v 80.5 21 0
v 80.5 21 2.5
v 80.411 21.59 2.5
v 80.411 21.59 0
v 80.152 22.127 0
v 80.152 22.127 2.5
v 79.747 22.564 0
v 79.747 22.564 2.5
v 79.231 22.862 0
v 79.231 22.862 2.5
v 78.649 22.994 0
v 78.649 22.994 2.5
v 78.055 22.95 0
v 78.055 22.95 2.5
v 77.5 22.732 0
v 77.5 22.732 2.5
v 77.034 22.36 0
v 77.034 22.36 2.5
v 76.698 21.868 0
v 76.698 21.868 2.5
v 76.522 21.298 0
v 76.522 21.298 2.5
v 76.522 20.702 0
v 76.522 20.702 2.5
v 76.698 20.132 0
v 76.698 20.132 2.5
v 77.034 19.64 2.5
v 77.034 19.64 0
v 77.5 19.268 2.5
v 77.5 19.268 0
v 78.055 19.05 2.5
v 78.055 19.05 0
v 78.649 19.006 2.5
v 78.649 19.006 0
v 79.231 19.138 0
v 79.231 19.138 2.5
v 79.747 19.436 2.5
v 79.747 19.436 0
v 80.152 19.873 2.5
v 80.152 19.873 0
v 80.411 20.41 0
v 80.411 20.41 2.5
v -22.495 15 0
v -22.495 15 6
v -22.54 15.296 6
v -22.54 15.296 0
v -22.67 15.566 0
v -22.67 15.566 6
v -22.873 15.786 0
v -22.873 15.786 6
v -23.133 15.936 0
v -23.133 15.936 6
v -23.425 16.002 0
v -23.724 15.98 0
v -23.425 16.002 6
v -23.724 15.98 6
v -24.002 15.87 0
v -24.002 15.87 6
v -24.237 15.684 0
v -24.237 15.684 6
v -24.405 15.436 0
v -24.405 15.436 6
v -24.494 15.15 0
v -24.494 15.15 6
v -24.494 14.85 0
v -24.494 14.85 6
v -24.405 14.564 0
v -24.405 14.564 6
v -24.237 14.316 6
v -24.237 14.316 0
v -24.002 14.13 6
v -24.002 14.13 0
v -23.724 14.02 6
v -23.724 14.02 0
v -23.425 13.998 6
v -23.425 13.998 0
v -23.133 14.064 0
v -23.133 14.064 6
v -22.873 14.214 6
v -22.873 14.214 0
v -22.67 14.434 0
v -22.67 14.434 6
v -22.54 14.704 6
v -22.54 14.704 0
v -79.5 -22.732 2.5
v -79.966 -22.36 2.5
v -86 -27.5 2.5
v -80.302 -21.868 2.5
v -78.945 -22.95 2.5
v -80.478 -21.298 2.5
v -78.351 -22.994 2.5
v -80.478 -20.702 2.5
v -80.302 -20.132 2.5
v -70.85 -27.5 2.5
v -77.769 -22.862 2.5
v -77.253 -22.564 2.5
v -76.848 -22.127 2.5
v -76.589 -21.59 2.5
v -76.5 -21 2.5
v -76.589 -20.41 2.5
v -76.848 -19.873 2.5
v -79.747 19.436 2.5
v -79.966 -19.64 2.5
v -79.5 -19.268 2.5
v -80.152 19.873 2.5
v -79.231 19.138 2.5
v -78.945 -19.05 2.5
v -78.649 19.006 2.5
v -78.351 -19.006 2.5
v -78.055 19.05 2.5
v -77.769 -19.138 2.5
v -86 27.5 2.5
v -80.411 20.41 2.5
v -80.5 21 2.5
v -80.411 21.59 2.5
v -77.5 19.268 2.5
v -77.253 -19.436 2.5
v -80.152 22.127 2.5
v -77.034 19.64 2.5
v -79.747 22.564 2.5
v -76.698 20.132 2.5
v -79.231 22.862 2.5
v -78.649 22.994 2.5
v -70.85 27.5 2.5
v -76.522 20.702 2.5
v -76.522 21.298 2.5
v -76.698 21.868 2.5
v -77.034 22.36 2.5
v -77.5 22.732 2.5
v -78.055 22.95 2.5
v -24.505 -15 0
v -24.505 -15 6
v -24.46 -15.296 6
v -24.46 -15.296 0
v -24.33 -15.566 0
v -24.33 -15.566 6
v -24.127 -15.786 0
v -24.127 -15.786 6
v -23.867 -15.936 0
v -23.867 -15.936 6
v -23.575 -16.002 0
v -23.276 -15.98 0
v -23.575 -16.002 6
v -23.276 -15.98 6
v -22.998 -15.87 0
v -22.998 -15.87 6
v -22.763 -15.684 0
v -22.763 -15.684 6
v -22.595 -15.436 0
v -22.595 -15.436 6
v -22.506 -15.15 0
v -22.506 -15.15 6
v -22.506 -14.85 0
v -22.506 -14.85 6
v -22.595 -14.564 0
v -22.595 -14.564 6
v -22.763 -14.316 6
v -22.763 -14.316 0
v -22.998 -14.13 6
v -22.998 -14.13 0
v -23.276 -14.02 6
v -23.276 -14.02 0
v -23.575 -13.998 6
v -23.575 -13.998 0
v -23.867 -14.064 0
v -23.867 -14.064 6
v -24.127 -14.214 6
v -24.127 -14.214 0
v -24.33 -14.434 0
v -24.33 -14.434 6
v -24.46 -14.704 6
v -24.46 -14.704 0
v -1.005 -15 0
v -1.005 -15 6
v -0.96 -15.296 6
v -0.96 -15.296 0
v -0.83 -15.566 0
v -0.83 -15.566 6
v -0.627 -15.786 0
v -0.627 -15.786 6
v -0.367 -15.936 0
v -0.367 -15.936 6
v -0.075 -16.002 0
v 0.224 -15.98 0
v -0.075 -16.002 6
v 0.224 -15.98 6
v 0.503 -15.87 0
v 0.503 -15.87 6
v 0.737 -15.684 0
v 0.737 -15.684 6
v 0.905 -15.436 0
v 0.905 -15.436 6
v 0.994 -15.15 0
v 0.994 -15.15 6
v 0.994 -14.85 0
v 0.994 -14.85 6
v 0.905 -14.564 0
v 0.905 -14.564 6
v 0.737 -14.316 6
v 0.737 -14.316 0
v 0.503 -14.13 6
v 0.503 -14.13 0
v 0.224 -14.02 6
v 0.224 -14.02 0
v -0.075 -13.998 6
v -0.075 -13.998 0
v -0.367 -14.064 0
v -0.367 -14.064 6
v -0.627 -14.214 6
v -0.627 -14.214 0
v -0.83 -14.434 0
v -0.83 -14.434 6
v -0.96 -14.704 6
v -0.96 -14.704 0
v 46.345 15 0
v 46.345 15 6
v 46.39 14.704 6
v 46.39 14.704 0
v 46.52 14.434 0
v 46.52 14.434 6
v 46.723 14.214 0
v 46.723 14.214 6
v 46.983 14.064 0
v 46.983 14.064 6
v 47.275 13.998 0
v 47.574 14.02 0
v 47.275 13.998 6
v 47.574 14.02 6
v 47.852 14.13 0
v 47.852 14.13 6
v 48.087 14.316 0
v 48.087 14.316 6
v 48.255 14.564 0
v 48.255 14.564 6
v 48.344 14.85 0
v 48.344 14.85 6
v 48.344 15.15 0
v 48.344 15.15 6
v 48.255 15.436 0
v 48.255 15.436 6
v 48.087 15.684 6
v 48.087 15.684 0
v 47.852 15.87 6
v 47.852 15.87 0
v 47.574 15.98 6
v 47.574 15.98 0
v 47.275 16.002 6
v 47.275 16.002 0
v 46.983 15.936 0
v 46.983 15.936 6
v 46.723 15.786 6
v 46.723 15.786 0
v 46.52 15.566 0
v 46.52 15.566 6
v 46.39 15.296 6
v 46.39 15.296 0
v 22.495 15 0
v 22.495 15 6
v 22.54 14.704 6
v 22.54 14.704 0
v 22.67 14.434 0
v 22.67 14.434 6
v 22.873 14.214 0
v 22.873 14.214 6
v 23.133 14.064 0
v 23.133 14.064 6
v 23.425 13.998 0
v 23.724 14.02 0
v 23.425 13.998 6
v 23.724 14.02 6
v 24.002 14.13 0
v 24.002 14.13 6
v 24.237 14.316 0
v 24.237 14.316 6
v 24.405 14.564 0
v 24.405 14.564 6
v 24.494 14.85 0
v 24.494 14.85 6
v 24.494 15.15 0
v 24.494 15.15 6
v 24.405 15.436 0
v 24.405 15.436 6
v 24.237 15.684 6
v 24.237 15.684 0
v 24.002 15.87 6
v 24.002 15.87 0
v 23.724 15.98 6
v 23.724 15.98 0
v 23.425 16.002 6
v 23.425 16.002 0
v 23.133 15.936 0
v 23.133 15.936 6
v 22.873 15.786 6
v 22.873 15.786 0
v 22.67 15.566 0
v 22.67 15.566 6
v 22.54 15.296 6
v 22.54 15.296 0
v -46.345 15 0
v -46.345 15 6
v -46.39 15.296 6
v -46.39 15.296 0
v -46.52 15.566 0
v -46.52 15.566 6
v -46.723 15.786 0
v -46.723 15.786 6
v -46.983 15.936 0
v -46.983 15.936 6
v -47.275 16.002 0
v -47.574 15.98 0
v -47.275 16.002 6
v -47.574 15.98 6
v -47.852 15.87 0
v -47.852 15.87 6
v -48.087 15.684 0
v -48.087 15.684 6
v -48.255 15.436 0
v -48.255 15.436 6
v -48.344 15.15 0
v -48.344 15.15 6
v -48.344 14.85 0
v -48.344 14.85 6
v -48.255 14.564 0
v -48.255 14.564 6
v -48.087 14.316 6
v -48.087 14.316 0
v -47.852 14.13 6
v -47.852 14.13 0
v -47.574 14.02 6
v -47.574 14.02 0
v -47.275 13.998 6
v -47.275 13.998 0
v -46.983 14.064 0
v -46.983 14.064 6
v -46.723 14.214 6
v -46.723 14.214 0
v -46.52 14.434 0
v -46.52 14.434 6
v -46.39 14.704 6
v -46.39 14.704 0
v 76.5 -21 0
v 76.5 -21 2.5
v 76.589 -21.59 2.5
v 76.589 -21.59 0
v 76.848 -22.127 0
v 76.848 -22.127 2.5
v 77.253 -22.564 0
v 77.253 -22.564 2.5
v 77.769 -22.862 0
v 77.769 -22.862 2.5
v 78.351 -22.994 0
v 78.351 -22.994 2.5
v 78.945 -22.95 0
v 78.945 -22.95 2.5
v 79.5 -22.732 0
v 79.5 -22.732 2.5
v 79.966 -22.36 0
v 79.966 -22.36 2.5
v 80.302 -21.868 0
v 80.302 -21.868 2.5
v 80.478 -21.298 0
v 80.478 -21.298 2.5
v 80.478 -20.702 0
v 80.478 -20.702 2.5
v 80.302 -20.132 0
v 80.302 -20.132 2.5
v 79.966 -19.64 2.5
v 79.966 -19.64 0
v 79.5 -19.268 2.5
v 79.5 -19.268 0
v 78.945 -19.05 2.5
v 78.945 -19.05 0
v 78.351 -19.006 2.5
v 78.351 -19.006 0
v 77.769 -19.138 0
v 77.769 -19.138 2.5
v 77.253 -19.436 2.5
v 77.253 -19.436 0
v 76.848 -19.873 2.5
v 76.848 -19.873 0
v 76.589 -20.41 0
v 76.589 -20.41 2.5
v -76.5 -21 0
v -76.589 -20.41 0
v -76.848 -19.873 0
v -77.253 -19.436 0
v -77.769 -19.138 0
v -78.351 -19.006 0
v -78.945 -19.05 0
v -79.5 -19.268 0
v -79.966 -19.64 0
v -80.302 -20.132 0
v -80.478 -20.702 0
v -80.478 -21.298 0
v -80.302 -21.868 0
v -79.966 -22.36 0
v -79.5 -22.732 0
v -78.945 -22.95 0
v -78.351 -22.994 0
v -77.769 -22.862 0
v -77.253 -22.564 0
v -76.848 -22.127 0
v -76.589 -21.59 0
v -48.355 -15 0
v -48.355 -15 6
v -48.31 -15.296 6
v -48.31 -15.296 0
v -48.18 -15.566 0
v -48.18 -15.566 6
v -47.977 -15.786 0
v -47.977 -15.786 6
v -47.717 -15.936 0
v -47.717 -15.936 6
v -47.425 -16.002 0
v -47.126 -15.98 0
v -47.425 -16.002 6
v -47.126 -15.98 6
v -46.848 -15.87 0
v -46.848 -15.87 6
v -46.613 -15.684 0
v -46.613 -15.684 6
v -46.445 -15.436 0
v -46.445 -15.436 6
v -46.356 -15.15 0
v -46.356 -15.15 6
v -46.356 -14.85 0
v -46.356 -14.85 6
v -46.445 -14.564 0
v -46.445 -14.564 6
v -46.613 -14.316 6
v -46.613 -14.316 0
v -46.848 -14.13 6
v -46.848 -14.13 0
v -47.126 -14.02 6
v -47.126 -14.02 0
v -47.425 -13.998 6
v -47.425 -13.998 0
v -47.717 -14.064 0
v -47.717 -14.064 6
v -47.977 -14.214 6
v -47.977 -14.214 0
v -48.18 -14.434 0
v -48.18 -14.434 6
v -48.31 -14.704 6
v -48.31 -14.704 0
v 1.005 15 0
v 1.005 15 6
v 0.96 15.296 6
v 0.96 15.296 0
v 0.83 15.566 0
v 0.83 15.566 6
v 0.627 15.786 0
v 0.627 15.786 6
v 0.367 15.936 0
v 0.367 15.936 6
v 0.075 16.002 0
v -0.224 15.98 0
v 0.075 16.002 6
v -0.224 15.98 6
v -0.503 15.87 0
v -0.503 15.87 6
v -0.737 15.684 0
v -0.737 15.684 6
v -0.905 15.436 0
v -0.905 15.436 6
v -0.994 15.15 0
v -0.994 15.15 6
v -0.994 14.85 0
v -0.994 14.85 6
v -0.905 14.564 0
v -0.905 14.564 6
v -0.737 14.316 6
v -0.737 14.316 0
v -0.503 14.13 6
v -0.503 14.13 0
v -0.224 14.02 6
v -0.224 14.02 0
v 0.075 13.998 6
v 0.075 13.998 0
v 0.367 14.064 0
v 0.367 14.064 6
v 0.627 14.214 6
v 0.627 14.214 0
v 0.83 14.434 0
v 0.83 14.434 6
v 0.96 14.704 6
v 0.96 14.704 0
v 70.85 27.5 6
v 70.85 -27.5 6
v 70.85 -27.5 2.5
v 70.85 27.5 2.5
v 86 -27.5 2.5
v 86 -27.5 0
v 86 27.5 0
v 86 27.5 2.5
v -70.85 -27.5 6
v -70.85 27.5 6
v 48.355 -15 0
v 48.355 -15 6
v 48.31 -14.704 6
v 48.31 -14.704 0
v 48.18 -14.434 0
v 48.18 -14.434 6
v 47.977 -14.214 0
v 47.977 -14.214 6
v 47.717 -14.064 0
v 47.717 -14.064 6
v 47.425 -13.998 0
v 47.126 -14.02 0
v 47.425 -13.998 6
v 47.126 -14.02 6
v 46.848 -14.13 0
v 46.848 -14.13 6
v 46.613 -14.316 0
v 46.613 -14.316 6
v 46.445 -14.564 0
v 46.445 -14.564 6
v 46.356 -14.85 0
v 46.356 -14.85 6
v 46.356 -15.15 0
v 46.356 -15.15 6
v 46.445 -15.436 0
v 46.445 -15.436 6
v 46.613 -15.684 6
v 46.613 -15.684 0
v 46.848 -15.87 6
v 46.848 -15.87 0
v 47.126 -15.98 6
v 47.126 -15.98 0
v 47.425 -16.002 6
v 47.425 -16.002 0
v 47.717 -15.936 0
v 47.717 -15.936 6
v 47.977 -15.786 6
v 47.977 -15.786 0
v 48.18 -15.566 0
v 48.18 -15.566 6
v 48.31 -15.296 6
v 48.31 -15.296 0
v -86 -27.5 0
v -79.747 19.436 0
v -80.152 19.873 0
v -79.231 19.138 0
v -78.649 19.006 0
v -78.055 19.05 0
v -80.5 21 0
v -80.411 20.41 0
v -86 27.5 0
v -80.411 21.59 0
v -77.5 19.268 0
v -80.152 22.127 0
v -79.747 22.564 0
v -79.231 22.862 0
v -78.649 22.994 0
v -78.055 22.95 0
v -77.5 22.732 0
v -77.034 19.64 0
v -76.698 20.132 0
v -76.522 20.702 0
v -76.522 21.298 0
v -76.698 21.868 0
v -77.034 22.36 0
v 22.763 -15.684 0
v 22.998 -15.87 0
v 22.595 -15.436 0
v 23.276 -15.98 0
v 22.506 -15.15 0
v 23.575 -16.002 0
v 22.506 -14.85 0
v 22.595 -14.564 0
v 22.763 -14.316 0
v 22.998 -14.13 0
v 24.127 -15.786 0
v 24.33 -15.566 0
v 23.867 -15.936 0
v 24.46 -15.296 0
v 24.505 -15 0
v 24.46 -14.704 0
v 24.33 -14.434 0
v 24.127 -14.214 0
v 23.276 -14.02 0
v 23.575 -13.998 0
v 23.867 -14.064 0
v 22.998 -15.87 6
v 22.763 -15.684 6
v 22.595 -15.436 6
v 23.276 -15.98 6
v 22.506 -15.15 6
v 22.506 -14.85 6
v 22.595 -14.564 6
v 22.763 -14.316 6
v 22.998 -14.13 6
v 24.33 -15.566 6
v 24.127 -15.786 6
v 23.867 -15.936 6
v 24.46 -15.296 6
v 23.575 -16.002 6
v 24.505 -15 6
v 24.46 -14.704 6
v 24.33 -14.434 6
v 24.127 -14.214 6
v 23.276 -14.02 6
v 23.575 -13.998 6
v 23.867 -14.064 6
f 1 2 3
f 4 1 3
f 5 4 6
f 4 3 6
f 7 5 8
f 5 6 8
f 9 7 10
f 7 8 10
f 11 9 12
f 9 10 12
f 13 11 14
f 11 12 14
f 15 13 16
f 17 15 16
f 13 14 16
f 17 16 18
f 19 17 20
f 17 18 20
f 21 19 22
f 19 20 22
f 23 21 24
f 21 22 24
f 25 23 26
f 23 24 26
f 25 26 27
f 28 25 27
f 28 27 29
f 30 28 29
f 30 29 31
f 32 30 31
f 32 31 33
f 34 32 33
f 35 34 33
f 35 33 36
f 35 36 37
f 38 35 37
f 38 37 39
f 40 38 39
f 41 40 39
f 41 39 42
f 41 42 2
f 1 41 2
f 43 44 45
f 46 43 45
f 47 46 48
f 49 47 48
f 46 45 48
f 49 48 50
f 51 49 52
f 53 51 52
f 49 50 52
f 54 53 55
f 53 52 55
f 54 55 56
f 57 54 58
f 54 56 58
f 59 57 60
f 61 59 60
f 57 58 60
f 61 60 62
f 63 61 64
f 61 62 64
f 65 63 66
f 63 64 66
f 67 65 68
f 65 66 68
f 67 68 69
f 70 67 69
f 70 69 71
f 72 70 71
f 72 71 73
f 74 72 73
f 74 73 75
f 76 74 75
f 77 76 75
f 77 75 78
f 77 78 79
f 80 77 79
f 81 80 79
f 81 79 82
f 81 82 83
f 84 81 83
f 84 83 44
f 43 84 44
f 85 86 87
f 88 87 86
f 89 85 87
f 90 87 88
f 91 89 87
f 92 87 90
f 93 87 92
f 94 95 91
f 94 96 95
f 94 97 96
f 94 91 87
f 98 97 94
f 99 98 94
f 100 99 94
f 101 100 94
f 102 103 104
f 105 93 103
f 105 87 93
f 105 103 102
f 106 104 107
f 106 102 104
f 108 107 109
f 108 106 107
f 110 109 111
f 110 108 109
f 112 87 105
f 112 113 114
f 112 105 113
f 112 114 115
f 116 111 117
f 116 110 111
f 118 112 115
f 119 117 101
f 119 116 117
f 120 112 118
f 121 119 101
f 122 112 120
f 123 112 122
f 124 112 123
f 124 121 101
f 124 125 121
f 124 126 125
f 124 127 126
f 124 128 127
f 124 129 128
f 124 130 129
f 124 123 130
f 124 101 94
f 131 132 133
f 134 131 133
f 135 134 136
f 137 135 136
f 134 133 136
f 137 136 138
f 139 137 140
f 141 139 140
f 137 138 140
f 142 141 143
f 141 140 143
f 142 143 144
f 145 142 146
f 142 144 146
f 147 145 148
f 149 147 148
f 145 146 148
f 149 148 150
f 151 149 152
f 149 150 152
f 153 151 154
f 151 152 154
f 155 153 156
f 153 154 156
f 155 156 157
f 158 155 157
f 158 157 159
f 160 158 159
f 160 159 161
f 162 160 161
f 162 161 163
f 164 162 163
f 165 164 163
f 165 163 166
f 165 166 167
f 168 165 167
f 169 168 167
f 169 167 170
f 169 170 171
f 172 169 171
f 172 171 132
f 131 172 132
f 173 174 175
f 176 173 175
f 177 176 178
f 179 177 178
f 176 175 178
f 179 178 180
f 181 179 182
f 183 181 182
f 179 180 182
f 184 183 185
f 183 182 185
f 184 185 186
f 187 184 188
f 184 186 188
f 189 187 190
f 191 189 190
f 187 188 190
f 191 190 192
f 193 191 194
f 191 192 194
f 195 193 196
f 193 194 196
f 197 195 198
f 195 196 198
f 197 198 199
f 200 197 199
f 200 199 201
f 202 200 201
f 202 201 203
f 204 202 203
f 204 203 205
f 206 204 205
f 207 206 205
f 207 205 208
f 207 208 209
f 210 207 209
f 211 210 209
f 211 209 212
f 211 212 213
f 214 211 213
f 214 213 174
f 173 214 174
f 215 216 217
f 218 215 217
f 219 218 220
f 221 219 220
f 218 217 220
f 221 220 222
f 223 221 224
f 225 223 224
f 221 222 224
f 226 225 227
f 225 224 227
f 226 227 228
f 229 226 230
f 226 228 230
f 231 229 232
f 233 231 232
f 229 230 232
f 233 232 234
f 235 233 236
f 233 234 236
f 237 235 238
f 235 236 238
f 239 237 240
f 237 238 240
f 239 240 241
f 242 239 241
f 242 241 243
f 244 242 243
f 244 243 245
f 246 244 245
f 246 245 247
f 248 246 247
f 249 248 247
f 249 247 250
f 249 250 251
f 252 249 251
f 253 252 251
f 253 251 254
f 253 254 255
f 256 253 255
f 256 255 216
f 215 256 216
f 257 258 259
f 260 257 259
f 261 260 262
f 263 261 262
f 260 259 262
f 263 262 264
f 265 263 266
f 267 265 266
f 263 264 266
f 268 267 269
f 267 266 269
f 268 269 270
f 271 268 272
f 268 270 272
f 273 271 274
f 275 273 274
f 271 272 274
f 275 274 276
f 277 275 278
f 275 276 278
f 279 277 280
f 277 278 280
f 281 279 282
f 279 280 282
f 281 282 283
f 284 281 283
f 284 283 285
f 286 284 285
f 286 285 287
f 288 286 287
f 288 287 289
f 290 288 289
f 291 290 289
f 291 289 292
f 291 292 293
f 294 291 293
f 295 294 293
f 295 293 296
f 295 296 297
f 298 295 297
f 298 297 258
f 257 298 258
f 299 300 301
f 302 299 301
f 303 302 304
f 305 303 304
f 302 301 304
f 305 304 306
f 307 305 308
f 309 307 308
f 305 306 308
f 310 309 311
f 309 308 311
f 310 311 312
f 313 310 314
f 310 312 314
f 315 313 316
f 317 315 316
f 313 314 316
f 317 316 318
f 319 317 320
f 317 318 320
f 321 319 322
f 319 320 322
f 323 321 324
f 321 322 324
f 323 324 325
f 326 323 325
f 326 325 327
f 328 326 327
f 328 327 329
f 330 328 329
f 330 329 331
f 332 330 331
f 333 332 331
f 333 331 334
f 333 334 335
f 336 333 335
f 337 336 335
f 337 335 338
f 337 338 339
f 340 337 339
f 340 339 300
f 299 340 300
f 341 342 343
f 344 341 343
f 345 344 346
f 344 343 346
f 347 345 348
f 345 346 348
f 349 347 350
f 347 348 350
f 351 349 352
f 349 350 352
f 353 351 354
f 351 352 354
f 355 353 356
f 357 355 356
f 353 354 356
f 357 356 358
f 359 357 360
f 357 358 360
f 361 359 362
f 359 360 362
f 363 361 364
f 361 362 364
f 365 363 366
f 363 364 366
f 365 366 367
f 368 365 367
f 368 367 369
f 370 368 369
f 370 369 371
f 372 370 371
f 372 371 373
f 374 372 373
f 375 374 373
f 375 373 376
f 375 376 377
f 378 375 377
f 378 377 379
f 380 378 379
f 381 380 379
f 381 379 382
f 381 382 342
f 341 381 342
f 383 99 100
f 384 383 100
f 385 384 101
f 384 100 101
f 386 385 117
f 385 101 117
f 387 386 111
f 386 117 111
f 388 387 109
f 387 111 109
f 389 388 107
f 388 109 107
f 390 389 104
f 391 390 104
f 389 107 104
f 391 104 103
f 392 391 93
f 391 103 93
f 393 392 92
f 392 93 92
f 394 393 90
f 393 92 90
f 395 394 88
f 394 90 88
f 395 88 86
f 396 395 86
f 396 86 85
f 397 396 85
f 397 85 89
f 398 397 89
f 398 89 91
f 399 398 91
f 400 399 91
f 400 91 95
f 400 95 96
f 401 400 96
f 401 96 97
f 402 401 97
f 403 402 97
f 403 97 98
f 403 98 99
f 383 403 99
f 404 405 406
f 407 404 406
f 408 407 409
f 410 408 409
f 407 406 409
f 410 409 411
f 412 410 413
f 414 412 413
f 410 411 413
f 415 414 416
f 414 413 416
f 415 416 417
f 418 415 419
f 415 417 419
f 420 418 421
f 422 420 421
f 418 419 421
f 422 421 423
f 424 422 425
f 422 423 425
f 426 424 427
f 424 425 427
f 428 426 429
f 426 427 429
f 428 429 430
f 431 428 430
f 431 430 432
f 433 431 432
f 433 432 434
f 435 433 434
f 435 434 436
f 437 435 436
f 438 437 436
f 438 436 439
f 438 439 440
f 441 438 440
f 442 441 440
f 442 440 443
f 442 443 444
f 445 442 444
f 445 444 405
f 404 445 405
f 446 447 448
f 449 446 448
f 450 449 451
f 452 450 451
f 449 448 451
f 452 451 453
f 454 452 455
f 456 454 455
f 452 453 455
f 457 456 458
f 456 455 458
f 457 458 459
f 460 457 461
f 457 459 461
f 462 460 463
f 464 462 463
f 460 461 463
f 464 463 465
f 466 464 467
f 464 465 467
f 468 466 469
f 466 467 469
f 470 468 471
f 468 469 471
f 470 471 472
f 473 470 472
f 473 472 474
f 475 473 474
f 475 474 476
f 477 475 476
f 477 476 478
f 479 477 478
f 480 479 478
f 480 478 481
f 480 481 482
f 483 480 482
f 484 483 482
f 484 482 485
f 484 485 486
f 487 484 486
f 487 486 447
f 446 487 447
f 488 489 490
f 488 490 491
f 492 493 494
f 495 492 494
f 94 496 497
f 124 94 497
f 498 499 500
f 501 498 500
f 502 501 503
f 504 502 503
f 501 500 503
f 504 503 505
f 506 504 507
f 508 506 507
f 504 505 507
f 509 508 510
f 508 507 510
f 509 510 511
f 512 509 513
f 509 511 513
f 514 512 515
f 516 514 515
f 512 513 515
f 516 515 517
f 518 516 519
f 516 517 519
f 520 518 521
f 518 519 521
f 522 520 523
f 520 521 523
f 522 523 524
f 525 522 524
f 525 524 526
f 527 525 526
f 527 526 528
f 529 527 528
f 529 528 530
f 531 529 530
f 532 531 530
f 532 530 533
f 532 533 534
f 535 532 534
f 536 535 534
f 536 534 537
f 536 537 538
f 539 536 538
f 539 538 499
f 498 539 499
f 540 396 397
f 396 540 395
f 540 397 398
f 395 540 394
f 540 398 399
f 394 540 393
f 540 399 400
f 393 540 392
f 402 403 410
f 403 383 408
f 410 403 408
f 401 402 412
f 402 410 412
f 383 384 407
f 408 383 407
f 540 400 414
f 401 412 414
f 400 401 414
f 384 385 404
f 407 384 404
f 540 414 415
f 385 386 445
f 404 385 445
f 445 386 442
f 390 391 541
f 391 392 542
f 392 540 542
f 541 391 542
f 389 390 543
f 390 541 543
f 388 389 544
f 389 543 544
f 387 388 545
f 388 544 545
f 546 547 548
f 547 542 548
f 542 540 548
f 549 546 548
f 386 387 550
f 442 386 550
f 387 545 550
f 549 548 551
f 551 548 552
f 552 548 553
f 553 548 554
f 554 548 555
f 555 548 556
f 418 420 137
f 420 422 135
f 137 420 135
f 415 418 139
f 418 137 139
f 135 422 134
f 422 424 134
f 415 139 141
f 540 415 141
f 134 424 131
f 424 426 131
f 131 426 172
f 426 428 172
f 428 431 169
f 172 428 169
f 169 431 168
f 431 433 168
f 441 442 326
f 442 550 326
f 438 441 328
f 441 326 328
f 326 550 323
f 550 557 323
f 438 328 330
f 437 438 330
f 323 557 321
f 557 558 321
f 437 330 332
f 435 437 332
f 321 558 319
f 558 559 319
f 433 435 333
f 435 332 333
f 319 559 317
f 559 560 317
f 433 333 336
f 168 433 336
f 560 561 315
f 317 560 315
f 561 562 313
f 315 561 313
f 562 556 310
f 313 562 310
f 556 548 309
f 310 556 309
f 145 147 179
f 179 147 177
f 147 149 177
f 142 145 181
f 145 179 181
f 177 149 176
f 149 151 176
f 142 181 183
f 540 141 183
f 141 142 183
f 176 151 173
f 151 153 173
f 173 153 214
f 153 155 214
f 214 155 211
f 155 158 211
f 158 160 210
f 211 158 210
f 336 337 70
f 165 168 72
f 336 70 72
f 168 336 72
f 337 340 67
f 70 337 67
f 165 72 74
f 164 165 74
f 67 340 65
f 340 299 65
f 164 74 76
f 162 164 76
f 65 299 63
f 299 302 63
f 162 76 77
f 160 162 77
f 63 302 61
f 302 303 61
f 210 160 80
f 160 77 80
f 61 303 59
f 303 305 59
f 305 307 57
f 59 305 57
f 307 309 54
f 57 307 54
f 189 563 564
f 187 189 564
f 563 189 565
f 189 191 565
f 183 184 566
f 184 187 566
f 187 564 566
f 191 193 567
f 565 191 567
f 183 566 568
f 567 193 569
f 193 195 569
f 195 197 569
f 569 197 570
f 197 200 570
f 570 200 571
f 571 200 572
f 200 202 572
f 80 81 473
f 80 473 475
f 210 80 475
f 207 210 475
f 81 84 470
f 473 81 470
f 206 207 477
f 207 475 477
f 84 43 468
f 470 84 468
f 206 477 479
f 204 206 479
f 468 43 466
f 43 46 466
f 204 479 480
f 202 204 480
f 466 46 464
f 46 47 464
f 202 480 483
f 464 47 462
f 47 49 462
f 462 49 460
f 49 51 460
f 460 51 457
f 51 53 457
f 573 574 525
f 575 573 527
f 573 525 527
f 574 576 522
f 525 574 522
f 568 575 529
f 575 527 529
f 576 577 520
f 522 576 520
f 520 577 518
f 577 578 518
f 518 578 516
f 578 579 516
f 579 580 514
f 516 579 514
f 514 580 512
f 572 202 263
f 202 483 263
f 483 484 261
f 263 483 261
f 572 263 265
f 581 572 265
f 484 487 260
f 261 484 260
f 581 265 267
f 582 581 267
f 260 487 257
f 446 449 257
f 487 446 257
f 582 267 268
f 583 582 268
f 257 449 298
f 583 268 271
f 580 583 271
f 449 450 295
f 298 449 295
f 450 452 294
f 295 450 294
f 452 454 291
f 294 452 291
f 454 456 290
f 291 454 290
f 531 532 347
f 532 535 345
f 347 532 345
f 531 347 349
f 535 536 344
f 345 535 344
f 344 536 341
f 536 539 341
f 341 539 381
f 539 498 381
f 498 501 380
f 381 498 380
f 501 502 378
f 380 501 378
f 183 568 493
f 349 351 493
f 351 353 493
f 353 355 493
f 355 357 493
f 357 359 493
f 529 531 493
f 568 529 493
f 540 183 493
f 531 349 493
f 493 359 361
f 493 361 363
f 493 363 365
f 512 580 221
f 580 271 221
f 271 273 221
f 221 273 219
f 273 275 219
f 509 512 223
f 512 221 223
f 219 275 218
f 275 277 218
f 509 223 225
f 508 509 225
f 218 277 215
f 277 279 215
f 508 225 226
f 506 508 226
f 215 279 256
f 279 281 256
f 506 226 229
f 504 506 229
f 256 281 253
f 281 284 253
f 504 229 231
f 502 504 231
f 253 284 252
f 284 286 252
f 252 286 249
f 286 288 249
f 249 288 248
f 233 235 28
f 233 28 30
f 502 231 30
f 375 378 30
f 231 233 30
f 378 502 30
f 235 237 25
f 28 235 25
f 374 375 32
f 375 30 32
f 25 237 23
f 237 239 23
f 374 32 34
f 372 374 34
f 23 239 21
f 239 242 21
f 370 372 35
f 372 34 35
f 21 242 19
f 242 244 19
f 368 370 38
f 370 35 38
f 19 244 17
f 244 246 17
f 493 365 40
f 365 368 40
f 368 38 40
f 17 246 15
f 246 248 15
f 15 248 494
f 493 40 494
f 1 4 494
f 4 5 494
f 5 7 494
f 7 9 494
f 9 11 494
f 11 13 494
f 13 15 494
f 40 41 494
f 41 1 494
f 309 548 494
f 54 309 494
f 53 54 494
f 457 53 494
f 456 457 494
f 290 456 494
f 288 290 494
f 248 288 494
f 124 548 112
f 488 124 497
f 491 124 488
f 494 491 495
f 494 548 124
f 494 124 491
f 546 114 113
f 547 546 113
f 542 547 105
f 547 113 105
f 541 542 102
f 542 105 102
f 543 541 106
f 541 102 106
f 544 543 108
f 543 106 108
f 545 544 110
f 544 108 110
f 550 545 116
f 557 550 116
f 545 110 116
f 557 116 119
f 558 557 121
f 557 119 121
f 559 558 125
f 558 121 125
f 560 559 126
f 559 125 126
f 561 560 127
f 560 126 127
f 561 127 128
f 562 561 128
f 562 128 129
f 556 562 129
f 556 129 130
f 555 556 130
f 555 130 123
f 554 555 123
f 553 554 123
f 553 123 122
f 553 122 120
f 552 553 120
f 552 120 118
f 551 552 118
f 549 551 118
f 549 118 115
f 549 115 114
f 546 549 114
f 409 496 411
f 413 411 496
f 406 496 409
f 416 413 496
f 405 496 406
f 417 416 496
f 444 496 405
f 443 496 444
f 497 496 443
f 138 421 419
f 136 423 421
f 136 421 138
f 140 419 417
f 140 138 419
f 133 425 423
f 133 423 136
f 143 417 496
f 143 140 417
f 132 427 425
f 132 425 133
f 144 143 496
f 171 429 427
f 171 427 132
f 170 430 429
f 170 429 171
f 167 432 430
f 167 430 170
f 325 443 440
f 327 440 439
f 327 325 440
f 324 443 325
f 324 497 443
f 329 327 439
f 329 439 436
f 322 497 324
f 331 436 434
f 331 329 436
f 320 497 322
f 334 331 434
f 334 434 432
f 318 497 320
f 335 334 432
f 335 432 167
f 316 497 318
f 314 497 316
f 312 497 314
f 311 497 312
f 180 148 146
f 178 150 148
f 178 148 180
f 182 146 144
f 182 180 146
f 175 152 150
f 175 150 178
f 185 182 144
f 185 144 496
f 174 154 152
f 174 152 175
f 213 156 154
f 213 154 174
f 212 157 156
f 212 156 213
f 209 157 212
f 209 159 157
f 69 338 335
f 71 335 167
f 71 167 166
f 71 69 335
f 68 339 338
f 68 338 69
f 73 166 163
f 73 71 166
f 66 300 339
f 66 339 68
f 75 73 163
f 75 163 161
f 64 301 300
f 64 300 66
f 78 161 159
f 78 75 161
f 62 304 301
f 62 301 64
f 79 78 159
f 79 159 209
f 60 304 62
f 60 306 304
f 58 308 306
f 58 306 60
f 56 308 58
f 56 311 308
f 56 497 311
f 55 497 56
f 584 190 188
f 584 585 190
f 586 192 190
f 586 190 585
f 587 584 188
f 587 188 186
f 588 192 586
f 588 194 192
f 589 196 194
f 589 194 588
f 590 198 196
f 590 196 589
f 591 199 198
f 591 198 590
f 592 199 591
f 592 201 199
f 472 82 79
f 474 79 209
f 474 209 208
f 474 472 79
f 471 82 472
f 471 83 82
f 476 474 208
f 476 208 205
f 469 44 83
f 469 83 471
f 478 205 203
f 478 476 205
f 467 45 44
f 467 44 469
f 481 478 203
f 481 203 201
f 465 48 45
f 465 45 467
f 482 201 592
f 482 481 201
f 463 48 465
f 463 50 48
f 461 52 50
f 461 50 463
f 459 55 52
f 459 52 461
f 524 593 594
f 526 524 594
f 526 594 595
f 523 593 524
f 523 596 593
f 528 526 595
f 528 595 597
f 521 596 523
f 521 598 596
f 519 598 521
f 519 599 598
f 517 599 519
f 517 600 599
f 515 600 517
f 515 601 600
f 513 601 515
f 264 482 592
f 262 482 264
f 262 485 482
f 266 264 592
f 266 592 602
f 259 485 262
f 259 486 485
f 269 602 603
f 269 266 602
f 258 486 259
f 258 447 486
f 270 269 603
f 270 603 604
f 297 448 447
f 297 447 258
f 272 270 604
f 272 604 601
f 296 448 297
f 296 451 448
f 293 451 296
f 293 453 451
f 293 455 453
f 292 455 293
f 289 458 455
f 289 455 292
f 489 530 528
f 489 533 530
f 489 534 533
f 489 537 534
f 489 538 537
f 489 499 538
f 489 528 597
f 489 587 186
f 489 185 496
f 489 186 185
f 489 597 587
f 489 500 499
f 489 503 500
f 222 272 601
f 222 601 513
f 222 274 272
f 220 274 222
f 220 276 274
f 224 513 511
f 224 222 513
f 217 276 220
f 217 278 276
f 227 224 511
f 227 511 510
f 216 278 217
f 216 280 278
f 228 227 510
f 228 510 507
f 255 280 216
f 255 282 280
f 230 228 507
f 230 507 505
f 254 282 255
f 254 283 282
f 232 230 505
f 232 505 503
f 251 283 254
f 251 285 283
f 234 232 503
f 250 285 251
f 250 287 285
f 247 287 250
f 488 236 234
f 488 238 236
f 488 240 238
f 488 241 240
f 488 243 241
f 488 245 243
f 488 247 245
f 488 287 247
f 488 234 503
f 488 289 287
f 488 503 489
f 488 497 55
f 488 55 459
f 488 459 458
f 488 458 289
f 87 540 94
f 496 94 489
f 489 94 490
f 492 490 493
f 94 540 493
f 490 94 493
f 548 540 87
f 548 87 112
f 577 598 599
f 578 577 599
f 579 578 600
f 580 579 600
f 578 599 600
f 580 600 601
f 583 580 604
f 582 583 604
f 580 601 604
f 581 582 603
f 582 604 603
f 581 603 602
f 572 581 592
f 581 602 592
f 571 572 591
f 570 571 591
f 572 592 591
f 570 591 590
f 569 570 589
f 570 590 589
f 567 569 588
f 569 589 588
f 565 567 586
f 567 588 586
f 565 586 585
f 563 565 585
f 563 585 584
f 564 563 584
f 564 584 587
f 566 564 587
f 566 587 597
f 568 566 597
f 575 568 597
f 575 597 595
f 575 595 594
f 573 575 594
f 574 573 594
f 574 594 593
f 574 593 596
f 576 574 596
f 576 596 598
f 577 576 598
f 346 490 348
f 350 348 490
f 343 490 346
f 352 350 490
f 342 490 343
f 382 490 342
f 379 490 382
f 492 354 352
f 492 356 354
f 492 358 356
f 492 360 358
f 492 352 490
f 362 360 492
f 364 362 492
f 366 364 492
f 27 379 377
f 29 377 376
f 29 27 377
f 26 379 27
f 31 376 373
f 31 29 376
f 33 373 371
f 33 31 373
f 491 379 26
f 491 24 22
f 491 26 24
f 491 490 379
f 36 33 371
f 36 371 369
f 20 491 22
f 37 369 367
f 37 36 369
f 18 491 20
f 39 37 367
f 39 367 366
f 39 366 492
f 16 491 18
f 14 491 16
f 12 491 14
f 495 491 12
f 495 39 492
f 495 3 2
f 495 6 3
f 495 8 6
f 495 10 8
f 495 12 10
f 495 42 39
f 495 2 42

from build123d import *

# Parameters (mm, degrees)
ESQUISSE1_W             = 172
ESQUISSE1_H             = 55
BOSS_EXTRU_1_DEPTH      = 6
ESQUISSE2_W             = 15.15
ESQUISSE2_H             = 55
ENL_V_MAT_EXTRU_1_DEPTH = 3.5
ESQUISSE3_R             = 2
ENL_V_MAT_EXTRU_2_DEPTH = 91.357622811
ESQUISSE4_R             = 1.005
ENL_V_MAT_EXTRU_3_DEPTH = 91.488949602


with BuildPart() as part:
    # Esquisse1 → Boss.-Extru.1 (new body)
    with BuildSketch(Plane.XY):
        Rectangle(ESQUISSE1_W, ESQUISSE1_H)
    extrude(amount=BOSS_EXTRU_1_DEPTH)

    # Esquisse2 → Enlèv. mat.-Extru.1 (cut)
    with BuildSketch(Plane.XY.offset(6)):
        with Locations((-78.425, 0)):
            Rectangle(ESQUISSE2_W, ESQUISSE2_H)
        with Locations((78.425, 0)):
            Rectangle(ESQUISSE2_W, ESQUISSE2_H)
    extrude(amount=-ENL_V_MAT_EXTRU_1_DEPTH, mode=Mode.SUBTRACT)

    # Esquisse3 → Enlèv. mat.-Extru.2 (cut, through all)
    with BuildSketch(Plane.XY.offset(2.5)):
        with Locations(Location((-78.5, 21, 0), (0, 0, 180))):
            Circle(ESQUISSE3_R)
        with Locations((-78.5, -21)):
            Circle(ESQUISSE3_R)
        with Locations(Location((78.5, -21, 0), (0, 0, 180))):
            Circle(ESQUISSE3_R)
        with Locations((78.5, 21)):
            Circle(ESQUISSE3_R)
    extrude(amount=-ENL_V_MAT_EXTRU_2_DEPTH, mode=Mode.SUBTRACT)

    # Esquisse4 → Enlèv. mat.-Extru.3 (cut, through all)
    with BuildSketch(Plane.XY.offset(6)):
        with Locations((-47.35, 15)):
            Circle(ESQUISSE4_R)
        with Locations((-23.5, 15)):
            Circle(ESQUISSE4_R)
        with Locations(Location((23.5, 15, 0), (0, 0, 180))):
            Circle(ESQUISSE4_R)
        with Locations(Location((47.35, 15, 0), (0, 0, 180))):
            Circle(ESQUISSE4_R)
        with Locations((47.35, -15)):
            Circle(ESQUISSE4_R)
        with Locations((23.5, -15)):
            Circle(ESQUISSE4_R)
        with Locations(Location((-23.5, -15, 0), (0, 0, 180))):
            Circle(ESQUISSE4_R)
        with Locations(Location((-47.35, -15, 0), (0, 0, 180))):
            Circle(ESQUISSE4_R)
        with Locations((0, 15)):
            Circle(ESQUISSE4_R)
        with Locations(Location((0, -15, 0), (0, 0, 180))):
            Circle(ESQUISSE4_R)
    extrude(amount=-ENL_V_MAT_EXTRU_3_DEPTH, mode=Mode.SUBTRACT)


solid = part.part
